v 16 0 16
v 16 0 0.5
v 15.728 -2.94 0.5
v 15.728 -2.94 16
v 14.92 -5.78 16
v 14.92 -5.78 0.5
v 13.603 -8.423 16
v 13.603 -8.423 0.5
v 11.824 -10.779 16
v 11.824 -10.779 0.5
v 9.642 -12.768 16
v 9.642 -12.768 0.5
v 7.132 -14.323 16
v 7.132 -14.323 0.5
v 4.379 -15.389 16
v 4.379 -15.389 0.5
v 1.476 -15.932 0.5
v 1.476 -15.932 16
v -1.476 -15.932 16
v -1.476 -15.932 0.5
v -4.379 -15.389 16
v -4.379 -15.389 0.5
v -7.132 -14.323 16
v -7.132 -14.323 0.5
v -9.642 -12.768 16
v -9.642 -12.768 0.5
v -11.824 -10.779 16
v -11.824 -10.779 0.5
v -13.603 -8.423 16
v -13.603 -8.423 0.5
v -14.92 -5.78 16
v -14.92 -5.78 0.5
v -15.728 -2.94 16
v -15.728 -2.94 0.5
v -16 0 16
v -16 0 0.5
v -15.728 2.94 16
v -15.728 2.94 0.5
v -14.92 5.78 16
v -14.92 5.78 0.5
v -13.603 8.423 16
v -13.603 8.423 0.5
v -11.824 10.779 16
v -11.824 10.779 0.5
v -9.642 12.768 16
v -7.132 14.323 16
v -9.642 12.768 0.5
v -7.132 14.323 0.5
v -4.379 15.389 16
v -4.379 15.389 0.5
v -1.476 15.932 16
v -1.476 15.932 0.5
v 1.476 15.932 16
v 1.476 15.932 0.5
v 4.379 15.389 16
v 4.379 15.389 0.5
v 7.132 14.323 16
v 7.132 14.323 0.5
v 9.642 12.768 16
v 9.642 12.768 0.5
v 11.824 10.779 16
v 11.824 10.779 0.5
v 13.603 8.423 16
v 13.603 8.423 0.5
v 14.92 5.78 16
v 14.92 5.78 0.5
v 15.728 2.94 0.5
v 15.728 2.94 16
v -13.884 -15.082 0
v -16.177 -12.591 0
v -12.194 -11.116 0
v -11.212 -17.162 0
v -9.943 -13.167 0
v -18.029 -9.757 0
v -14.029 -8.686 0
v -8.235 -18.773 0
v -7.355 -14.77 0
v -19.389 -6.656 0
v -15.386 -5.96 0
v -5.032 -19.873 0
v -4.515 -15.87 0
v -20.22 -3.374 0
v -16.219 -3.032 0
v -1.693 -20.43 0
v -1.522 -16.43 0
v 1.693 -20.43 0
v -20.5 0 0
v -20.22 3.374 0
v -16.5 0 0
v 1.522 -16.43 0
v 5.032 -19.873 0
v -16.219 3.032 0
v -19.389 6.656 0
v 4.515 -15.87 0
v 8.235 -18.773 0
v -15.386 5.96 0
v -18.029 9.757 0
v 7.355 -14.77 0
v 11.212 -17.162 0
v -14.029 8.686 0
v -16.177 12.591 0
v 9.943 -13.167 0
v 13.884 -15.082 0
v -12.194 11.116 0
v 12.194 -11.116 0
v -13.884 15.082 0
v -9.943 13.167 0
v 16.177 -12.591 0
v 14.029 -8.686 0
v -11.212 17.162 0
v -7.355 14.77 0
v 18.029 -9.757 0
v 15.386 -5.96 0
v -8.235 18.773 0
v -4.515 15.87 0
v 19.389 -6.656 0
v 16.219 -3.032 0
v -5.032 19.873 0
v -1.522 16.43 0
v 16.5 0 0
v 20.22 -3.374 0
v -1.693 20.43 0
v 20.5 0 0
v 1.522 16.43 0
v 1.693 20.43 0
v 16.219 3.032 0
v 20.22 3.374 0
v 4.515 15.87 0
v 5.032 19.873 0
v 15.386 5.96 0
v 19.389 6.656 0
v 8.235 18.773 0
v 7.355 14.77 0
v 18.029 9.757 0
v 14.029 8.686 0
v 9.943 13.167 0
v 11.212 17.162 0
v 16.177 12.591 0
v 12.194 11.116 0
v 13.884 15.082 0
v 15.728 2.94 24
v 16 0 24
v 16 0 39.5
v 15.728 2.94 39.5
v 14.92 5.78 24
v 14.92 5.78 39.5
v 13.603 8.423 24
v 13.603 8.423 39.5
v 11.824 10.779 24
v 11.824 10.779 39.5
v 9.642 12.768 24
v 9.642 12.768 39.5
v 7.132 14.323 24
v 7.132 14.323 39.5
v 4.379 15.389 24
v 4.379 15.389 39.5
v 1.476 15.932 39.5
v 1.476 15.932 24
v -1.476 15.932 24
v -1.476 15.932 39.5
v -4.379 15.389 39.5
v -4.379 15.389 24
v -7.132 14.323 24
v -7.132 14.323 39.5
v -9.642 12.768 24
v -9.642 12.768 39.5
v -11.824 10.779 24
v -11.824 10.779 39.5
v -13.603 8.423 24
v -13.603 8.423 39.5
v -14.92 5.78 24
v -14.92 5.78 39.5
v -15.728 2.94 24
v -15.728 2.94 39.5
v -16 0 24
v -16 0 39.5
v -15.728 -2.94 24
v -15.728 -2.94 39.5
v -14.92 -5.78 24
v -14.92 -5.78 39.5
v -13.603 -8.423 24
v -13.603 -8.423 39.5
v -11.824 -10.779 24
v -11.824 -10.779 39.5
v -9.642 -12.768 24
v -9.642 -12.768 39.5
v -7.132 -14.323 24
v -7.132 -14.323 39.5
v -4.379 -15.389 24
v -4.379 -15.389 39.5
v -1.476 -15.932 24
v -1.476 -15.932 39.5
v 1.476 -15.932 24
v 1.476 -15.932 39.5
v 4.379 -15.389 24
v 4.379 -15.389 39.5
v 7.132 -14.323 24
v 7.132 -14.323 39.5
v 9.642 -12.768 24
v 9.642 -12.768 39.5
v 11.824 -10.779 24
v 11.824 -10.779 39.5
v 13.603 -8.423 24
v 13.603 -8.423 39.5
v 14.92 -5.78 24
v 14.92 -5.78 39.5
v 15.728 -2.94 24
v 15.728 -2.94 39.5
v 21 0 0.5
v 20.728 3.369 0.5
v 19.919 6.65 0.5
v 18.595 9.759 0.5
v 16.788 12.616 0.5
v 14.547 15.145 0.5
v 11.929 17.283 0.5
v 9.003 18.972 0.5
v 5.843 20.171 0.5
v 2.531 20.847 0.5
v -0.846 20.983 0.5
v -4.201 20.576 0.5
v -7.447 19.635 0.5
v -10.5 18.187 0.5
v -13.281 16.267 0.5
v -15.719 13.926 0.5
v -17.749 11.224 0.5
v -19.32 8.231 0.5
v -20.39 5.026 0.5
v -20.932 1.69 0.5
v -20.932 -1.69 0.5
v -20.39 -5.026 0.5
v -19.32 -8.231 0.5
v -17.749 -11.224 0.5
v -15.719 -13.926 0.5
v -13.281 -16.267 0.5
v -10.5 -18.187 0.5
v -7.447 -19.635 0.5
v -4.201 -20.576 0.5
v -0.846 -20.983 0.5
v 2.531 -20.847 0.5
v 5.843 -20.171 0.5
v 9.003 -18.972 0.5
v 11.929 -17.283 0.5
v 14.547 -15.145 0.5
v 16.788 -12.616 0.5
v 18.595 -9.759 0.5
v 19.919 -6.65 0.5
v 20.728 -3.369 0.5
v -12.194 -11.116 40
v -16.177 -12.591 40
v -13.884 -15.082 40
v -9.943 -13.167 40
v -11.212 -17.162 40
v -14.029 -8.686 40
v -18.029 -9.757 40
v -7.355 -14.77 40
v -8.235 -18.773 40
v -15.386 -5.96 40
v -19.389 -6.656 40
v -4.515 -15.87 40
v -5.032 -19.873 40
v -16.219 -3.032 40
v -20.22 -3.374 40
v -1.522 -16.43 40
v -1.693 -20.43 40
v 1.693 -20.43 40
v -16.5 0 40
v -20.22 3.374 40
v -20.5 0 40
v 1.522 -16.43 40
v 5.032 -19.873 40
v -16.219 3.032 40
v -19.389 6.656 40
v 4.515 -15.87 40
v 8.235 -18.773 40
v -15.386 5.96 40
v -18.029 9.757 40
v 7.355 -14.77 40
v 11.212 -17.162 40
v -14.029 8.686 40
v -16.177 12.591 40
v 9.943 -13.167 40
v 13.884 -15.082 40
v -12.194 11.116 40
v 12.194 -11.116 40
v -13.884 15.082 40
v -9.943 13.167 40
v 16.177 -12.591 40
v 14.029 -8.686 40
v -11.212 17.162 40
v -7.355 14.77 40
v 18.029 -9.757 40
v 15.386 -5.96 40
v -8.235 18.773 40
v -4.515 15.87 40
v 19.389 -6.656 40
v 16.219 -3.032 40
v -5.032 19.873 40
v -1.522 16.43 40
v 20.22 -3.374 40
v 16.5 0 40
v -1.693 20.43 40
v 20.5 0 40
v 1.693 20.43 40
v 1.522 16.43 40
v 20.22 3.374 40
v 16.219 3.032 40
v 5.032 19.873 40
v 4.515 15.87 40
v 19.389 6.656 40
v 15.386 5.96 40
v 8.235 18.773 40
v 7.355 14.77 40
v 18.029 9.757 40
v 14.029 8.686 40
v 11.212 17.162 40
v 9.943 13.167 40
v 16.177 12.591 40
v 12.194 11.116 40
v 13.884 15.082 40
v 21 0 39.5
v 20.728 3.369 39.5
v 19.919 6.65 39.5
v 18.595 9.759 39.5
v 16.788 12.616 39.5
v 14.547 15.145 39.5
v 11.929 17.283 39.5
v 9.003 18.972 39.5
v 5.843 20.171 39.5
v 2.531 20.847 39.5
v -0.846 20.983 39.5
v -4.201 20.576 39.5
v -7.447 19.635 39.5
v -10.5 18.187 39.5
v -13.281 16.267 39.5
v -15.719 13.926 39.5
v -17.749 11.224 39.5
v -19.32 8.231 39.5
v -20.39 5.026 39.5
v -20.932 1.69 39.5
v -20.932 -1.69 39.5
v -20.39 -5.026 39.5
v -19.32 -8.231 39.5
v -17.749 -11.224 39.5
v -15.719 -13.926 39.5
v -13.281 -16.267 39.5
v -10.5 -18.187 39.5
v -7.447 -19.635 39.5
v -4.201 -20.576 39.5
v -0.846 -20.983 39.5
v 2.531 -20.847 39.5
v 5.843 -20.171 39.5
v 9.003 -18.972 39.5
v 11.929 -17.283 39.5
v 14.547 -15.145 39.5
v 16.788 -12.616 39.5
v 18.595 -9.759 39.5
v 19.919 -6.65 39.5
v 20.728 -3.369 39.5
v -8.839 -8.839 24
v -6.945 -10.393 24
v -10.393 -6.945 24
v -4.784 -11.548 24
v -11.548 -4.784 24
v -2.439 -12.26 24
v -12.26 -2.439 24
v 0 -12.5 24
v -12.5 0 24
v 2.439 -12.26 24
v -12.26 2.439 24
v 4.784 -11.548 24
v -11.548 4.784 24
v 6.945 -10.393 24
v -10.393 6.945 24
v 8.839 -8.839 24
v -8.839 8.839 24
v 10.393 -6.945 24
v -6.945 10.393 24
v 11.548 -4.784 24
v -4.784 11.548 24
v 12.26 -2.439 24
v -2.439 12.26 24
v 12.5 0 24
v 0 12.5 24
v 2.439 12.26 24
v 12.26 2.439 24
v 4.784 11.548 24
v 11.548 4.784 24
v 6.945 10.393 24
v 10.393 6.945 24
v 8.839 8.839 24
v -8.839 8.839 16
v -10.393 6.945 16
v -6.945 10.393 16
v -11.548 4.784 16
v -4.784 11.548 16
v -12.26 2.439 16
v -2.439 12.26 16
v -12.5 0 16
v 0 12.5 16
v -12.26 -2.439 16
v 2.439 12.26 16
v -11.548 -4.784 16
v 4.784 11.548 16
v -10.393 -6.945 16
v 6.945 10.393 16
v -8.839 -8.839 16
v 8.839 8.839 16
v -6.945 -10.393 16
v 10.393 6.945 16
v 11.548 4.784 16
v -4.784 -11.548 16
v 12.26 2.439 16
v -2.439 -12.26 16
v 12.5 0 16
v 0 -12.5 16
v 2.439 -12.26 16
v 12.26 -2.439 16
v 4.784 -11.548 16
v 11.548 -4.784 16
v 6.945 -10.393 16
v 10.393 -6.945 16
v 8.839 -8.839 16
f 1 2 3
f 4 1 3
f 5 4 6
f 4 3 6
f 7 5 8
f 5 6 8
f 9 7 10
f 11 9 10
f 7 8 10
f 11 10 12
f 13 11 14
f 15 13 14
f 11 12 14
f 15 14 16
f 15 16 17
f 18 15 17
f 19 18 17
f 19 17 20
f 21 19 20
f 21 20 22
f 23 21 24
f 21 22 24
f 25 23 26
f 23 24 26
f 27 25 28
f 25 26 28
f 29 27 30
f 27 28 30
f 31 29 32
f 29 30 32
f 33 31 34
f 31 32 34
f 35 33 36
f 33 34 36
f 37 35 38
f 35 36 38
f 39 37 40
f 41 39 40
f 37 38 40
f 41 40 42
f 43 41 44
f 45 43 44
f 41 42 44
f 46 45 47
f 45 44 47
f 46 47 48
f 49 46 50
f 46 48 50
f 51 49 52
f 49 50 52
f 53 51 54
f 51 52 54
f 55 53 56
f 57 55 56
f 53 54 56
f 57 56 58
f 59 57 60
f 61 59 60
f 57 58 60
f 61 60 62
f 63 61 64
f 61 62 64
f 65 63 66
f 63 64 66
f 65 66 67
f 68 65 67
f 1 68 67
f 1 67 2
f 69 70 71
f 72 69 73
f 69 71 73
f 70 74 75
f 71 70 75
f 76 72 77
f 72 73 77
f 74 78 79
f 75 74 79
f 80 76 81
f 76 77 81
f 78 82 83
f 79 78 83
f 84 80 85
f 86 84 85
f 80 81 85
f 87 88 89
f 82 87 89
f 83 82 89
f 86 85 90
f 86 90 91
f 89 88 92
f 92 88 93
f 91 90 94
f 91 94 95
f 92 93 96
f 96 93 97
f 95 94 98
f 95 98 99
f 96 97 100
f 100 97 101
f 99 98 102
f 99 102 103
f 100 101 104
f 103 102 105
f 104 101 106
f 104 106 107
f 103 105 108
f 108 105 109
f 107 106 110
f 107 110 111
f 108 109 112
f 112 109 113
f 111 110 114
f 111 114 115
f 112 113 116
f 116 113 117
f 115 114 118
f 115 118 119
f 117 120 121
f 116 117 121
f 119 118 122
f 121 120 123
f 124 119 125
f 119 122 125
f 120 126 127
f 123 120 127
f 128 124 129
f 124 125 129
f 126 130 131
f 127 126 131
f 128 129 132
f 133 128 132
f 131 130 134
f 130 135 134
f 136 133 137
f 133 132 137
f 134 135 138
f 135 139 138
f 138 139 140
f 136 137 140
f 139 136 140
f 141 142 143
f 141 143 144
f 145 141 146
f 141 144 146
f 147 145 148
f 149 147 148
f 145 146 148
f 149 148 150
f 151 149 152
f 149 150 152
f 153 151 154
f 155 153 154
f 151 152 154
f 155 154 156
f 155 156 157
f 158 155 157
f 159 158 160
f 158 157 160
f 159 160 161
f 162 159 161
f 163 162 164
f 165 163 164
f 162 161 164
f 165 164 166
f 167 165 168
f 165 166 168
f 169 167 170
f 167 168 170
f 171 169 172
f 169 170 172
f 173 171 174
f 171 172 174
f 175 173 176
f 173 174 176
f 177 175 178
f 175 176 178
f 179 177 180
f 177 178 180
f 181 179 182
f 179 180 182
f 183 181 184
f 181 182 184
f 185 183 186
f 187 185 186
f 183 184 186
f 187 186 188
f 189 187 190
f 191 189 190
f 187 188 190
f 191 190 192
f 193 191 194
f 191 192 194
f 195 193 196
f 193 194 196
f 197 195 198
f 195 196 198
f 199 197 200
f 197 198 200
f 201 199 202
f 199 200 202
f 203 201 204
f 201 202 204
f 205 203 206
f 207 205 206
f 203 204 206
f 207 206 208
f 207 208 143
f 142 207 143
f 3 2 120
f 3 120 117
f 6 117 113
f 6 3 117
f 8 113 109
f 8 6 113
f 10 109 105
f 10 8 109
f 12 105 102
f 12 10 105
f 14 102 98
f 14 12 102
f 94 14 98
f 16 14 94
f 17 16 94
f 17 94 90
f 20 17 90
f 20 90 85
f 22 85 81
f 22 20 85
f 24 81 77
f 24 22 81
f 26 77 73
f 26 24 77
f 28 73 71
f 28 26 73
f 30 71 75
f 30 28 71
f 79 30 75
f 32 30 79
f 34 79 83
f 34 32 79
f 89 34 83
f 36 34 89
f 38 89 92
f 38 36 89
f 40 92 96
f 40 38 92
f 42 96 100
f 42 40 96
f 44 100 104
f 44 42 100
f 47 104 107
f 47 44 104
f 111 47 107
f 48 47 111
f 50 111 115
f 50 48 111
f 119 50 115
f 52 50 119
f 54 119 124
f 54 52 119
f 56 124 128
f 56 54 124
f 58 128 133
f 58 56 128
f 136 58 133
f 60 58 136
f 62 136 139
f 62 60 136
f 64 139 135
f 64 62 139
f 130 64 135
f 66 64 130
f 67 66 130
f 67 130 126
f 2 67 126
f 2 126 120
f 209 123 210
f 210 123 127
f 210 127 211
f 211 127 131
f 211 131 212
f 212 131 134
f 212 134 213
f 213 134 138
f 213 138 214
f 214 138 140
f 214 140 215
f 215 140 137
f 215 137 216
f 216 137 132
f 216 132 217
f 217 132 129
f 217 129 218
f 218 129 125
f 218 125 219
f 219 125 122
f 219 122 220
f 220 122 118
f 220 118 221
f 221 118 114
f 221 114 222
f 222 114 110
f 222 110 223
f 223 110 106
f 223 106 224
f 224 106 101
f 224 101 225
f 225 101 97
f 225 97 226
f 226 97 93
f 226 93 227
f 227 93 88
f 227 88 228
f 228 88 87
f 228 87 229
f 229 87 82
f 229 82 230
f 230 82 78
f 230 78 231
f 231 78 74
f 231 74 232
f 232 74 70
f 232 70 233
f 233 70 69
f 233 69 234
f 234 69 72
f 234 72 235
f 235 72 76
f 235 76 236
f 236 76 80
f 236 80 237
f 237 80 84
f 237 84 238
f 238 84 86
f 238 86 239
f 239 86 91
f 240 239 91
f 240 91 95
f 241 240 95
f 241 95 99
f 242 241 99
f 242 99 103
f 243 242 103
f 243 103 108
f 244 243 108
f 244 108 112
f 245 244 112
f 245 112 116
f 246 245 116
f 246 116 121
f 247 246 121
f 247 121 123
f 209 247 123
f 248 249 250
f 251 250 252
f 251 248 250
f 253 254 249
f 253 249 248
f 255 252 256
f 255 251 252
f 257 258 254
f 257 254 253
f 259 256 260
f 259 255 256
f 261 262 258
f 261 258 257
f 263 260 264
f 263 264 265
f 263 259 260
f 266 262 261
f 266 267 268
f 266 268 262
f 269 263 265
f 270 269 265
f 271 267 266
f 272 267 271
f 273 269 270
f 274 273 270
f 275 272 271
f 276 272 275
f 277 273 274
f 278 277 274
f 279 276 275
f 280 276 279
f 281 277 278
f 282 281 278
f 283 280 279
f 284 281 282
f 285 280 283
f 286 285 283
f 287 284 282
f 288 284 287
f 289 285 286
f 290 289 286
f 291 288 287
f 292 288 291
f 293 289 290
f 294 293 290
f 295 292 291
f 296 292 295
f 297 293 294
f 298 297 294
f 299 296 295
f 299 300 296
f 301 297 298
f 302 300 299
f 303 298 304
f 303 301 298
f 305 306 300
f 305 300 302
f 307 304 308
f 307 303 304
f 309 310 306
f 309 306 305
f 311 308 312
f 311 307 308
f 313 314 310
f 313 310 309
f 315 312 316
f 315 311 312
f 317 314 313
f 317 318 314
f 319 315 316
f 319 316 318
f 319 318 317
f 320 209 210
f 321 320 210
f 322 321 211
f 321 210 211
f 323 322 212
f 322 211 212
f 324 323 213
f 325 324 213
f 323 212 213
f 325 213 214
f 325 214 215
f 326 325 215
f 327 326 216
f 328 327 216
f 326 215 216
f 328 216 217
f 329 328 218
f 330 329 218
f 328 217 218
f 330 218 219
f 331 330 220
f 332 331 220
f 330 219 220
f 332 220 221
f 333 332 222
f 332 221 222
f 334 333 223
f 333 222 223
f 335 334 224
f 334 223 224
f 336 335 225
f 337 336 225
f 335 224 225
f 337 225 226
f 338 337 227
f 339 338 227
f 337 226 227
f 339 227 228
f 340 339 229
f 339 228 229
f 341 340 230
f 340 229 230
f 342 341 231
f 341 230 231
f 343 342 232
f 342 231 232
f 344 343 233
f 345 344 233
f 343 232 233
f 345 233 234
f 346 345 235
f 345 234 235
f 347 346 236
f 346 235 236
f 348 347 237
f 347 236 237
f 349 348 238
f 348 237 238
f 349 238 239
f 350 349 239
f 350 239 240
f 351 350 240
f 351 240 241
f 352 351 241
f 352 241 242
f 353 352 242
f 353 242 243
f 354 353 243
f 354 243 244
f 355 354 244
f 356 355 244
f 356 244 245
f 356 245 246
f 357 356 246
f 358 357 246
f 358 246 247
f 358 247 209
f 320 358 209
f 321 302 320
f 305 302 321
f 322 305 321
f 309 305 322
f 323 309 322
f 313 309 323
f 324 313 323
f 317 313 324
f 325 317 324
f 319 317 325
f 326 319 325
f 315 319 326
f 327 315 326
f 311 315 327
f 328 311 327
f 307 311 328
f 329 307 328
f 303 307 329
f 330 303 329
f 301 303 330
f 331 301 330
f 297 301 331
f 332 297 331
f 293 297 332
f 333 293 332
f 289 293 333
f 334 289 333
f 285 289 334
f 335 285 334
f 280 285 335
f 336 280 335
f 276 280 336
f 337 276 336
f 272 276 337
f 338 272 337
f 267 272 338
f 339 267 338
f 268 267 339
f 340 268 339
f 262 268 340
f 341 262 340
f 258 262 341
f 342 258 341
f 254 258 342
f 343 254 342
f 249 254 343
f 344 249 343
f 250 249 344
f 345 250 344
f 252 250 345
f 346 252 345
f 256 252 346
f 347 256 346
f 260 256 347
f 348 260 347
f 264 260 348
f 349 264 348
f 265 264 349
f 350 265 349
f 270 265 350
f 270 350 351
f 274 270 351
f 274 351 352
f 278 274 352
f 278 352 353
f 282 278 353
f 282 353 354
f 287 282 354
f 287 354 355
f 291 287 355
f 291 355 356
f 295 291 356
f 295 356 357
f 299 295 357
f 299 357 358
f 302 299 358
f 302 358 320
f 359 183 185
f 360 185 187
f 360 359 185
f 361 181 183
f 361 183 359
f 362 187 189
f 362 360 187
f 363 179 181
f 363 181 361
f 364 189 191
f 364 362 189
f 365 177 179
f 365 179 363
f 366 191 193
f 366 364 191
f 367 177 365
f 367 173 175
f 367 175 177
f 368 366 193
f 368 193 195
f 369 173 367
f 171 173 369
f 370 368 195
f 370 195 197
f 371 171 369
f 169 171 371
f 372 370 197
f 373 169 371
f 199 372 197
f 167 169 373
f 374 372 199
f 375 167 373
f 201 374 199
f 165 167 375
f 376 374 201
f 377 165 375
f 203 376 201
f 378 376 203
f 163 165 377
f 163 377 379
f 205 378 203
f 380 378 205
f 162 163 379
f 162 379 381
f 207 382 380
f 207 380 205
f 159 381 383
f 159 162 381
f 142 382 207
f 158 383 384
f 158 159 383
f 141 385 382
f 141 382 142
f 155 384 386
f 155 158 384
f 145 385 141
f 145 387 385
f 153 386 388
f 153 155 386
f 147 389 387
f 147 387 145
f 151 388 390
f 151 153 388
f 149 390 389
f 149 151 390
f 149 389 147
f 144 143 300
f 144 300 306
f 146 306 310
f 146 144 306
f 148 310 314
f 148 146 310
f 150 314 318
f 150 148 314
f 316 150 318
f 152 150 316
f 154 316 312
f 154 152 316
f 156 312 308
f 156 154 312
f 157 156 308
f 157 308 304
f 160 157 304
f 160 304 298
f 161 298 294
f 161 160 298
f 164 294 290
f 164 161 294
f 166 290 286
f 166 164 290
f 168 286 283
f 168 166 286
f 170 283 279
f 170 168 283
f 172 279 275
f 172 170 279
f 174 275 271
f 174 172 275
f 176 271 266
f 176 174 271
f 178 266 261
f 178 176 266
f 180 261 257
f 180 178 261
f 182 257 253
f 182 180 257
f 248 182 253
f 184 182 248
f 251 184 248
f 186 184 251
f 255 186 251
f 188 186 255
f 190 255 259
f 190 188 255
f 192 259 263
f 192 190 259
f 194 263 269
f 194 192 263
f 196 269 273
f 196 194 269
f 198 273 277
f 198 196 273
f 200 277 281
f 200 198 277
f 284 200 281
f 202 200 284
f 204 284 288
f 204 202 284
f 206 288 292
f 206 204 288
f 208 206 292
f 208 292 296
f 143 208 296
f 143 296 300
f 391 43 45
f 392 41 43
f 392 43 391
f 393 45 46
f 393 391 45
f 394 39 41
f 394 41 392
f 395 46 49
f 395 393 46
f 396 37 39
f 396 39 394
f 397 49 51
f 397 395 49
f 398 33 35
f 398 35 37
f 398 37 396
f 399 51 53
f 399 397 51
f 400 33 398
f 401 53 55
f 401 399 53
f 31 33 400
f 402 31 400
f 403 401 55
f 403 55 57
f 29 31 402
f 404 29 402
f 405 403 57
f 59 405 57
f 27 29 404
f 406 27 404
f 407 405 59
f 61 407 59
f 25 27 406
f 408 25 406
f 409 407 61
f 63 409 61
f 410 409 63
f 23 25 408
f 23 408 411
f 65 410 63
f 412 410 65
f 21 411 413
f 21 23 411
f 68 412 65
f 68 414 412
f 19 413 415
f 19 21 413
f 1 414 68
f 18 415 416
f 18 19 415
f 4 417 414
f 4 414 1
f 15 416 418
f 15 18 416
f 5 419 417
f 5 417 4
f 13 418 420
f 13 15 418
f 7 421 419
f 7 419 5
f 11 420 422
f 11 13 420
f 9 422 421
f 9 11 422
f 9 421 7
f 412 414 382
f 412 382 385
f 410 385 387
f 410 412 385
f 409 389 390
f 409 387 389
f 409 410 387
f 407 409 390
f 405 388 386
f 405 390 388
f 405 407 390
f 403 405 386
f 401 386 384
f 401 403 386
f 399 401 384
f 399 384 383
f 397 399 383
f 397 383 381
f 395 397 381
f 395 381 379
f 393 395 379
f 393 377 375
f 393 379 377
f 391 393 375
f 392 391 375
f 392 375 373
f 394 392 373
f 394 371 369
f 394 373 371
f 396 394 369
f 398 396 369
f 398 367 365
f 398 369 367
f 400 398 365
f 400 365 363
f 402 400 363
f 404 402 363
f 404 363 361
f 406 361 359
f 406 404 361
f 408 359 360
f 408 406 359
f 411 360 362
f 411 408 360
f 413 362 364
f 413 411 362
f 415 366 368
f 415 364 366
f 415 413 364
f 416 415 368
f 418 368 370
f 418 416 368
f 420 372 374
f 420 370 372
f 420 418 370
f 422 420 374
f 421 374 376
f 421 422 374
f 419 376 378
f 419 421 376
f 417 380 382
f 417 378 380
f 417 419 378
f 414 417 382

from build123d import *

# Parameters (mm, degrees)
F0_R     = 21
F0_R_2   = 12.5
F1_DEPTH = 40
F2_R     = 16
F3_DEPTH = 16
F4_R     = 16
F4_R_2   = 12.5
F5_DEPTH = 16
F6_SIZE  = 0.5


with BuildPart() as f1:
    # F0 (on Top) → F1 (new body)
    with BuildSketch(Plane.XY):
        Circle(F0_R)
        Circle(F0_R_2, mode=Mode.SUBTRACT)
    extrude(amount=F1_DEPTH)

    # F2 (on face) → F3 (cut)
    with BuildSketch(Plane.XY.offset(40)):
        Circle(F2_R)
    extrude(amount=-F3_DEPTH, mode=Mode.SUBTRACT)

    # F4 (on face) → F5 (cut)
    with BuildSketch(Plane(origin=(0, 0, 0), x_dir=(1, 0, 0), z_dir=(0, 0, -1))):
        Circle(F4_R)
        Circle(F4_R_2, mode=Mode.SUBTRACT)
    extrude(amount=-F5_DEPTH, mode=Mode.SUBTRACT)

    # F6
    f6_edges = [f1.edges().sort_by_distance(p)[0] for p in [
        (-21, 0, 0),
        (-16, 0, 0),
        (-21, 0, 40),
        (-16, 0, 40),
    ]]
    chamfer(f6_edges, length=F6_SIZE)


solid = f1.part
